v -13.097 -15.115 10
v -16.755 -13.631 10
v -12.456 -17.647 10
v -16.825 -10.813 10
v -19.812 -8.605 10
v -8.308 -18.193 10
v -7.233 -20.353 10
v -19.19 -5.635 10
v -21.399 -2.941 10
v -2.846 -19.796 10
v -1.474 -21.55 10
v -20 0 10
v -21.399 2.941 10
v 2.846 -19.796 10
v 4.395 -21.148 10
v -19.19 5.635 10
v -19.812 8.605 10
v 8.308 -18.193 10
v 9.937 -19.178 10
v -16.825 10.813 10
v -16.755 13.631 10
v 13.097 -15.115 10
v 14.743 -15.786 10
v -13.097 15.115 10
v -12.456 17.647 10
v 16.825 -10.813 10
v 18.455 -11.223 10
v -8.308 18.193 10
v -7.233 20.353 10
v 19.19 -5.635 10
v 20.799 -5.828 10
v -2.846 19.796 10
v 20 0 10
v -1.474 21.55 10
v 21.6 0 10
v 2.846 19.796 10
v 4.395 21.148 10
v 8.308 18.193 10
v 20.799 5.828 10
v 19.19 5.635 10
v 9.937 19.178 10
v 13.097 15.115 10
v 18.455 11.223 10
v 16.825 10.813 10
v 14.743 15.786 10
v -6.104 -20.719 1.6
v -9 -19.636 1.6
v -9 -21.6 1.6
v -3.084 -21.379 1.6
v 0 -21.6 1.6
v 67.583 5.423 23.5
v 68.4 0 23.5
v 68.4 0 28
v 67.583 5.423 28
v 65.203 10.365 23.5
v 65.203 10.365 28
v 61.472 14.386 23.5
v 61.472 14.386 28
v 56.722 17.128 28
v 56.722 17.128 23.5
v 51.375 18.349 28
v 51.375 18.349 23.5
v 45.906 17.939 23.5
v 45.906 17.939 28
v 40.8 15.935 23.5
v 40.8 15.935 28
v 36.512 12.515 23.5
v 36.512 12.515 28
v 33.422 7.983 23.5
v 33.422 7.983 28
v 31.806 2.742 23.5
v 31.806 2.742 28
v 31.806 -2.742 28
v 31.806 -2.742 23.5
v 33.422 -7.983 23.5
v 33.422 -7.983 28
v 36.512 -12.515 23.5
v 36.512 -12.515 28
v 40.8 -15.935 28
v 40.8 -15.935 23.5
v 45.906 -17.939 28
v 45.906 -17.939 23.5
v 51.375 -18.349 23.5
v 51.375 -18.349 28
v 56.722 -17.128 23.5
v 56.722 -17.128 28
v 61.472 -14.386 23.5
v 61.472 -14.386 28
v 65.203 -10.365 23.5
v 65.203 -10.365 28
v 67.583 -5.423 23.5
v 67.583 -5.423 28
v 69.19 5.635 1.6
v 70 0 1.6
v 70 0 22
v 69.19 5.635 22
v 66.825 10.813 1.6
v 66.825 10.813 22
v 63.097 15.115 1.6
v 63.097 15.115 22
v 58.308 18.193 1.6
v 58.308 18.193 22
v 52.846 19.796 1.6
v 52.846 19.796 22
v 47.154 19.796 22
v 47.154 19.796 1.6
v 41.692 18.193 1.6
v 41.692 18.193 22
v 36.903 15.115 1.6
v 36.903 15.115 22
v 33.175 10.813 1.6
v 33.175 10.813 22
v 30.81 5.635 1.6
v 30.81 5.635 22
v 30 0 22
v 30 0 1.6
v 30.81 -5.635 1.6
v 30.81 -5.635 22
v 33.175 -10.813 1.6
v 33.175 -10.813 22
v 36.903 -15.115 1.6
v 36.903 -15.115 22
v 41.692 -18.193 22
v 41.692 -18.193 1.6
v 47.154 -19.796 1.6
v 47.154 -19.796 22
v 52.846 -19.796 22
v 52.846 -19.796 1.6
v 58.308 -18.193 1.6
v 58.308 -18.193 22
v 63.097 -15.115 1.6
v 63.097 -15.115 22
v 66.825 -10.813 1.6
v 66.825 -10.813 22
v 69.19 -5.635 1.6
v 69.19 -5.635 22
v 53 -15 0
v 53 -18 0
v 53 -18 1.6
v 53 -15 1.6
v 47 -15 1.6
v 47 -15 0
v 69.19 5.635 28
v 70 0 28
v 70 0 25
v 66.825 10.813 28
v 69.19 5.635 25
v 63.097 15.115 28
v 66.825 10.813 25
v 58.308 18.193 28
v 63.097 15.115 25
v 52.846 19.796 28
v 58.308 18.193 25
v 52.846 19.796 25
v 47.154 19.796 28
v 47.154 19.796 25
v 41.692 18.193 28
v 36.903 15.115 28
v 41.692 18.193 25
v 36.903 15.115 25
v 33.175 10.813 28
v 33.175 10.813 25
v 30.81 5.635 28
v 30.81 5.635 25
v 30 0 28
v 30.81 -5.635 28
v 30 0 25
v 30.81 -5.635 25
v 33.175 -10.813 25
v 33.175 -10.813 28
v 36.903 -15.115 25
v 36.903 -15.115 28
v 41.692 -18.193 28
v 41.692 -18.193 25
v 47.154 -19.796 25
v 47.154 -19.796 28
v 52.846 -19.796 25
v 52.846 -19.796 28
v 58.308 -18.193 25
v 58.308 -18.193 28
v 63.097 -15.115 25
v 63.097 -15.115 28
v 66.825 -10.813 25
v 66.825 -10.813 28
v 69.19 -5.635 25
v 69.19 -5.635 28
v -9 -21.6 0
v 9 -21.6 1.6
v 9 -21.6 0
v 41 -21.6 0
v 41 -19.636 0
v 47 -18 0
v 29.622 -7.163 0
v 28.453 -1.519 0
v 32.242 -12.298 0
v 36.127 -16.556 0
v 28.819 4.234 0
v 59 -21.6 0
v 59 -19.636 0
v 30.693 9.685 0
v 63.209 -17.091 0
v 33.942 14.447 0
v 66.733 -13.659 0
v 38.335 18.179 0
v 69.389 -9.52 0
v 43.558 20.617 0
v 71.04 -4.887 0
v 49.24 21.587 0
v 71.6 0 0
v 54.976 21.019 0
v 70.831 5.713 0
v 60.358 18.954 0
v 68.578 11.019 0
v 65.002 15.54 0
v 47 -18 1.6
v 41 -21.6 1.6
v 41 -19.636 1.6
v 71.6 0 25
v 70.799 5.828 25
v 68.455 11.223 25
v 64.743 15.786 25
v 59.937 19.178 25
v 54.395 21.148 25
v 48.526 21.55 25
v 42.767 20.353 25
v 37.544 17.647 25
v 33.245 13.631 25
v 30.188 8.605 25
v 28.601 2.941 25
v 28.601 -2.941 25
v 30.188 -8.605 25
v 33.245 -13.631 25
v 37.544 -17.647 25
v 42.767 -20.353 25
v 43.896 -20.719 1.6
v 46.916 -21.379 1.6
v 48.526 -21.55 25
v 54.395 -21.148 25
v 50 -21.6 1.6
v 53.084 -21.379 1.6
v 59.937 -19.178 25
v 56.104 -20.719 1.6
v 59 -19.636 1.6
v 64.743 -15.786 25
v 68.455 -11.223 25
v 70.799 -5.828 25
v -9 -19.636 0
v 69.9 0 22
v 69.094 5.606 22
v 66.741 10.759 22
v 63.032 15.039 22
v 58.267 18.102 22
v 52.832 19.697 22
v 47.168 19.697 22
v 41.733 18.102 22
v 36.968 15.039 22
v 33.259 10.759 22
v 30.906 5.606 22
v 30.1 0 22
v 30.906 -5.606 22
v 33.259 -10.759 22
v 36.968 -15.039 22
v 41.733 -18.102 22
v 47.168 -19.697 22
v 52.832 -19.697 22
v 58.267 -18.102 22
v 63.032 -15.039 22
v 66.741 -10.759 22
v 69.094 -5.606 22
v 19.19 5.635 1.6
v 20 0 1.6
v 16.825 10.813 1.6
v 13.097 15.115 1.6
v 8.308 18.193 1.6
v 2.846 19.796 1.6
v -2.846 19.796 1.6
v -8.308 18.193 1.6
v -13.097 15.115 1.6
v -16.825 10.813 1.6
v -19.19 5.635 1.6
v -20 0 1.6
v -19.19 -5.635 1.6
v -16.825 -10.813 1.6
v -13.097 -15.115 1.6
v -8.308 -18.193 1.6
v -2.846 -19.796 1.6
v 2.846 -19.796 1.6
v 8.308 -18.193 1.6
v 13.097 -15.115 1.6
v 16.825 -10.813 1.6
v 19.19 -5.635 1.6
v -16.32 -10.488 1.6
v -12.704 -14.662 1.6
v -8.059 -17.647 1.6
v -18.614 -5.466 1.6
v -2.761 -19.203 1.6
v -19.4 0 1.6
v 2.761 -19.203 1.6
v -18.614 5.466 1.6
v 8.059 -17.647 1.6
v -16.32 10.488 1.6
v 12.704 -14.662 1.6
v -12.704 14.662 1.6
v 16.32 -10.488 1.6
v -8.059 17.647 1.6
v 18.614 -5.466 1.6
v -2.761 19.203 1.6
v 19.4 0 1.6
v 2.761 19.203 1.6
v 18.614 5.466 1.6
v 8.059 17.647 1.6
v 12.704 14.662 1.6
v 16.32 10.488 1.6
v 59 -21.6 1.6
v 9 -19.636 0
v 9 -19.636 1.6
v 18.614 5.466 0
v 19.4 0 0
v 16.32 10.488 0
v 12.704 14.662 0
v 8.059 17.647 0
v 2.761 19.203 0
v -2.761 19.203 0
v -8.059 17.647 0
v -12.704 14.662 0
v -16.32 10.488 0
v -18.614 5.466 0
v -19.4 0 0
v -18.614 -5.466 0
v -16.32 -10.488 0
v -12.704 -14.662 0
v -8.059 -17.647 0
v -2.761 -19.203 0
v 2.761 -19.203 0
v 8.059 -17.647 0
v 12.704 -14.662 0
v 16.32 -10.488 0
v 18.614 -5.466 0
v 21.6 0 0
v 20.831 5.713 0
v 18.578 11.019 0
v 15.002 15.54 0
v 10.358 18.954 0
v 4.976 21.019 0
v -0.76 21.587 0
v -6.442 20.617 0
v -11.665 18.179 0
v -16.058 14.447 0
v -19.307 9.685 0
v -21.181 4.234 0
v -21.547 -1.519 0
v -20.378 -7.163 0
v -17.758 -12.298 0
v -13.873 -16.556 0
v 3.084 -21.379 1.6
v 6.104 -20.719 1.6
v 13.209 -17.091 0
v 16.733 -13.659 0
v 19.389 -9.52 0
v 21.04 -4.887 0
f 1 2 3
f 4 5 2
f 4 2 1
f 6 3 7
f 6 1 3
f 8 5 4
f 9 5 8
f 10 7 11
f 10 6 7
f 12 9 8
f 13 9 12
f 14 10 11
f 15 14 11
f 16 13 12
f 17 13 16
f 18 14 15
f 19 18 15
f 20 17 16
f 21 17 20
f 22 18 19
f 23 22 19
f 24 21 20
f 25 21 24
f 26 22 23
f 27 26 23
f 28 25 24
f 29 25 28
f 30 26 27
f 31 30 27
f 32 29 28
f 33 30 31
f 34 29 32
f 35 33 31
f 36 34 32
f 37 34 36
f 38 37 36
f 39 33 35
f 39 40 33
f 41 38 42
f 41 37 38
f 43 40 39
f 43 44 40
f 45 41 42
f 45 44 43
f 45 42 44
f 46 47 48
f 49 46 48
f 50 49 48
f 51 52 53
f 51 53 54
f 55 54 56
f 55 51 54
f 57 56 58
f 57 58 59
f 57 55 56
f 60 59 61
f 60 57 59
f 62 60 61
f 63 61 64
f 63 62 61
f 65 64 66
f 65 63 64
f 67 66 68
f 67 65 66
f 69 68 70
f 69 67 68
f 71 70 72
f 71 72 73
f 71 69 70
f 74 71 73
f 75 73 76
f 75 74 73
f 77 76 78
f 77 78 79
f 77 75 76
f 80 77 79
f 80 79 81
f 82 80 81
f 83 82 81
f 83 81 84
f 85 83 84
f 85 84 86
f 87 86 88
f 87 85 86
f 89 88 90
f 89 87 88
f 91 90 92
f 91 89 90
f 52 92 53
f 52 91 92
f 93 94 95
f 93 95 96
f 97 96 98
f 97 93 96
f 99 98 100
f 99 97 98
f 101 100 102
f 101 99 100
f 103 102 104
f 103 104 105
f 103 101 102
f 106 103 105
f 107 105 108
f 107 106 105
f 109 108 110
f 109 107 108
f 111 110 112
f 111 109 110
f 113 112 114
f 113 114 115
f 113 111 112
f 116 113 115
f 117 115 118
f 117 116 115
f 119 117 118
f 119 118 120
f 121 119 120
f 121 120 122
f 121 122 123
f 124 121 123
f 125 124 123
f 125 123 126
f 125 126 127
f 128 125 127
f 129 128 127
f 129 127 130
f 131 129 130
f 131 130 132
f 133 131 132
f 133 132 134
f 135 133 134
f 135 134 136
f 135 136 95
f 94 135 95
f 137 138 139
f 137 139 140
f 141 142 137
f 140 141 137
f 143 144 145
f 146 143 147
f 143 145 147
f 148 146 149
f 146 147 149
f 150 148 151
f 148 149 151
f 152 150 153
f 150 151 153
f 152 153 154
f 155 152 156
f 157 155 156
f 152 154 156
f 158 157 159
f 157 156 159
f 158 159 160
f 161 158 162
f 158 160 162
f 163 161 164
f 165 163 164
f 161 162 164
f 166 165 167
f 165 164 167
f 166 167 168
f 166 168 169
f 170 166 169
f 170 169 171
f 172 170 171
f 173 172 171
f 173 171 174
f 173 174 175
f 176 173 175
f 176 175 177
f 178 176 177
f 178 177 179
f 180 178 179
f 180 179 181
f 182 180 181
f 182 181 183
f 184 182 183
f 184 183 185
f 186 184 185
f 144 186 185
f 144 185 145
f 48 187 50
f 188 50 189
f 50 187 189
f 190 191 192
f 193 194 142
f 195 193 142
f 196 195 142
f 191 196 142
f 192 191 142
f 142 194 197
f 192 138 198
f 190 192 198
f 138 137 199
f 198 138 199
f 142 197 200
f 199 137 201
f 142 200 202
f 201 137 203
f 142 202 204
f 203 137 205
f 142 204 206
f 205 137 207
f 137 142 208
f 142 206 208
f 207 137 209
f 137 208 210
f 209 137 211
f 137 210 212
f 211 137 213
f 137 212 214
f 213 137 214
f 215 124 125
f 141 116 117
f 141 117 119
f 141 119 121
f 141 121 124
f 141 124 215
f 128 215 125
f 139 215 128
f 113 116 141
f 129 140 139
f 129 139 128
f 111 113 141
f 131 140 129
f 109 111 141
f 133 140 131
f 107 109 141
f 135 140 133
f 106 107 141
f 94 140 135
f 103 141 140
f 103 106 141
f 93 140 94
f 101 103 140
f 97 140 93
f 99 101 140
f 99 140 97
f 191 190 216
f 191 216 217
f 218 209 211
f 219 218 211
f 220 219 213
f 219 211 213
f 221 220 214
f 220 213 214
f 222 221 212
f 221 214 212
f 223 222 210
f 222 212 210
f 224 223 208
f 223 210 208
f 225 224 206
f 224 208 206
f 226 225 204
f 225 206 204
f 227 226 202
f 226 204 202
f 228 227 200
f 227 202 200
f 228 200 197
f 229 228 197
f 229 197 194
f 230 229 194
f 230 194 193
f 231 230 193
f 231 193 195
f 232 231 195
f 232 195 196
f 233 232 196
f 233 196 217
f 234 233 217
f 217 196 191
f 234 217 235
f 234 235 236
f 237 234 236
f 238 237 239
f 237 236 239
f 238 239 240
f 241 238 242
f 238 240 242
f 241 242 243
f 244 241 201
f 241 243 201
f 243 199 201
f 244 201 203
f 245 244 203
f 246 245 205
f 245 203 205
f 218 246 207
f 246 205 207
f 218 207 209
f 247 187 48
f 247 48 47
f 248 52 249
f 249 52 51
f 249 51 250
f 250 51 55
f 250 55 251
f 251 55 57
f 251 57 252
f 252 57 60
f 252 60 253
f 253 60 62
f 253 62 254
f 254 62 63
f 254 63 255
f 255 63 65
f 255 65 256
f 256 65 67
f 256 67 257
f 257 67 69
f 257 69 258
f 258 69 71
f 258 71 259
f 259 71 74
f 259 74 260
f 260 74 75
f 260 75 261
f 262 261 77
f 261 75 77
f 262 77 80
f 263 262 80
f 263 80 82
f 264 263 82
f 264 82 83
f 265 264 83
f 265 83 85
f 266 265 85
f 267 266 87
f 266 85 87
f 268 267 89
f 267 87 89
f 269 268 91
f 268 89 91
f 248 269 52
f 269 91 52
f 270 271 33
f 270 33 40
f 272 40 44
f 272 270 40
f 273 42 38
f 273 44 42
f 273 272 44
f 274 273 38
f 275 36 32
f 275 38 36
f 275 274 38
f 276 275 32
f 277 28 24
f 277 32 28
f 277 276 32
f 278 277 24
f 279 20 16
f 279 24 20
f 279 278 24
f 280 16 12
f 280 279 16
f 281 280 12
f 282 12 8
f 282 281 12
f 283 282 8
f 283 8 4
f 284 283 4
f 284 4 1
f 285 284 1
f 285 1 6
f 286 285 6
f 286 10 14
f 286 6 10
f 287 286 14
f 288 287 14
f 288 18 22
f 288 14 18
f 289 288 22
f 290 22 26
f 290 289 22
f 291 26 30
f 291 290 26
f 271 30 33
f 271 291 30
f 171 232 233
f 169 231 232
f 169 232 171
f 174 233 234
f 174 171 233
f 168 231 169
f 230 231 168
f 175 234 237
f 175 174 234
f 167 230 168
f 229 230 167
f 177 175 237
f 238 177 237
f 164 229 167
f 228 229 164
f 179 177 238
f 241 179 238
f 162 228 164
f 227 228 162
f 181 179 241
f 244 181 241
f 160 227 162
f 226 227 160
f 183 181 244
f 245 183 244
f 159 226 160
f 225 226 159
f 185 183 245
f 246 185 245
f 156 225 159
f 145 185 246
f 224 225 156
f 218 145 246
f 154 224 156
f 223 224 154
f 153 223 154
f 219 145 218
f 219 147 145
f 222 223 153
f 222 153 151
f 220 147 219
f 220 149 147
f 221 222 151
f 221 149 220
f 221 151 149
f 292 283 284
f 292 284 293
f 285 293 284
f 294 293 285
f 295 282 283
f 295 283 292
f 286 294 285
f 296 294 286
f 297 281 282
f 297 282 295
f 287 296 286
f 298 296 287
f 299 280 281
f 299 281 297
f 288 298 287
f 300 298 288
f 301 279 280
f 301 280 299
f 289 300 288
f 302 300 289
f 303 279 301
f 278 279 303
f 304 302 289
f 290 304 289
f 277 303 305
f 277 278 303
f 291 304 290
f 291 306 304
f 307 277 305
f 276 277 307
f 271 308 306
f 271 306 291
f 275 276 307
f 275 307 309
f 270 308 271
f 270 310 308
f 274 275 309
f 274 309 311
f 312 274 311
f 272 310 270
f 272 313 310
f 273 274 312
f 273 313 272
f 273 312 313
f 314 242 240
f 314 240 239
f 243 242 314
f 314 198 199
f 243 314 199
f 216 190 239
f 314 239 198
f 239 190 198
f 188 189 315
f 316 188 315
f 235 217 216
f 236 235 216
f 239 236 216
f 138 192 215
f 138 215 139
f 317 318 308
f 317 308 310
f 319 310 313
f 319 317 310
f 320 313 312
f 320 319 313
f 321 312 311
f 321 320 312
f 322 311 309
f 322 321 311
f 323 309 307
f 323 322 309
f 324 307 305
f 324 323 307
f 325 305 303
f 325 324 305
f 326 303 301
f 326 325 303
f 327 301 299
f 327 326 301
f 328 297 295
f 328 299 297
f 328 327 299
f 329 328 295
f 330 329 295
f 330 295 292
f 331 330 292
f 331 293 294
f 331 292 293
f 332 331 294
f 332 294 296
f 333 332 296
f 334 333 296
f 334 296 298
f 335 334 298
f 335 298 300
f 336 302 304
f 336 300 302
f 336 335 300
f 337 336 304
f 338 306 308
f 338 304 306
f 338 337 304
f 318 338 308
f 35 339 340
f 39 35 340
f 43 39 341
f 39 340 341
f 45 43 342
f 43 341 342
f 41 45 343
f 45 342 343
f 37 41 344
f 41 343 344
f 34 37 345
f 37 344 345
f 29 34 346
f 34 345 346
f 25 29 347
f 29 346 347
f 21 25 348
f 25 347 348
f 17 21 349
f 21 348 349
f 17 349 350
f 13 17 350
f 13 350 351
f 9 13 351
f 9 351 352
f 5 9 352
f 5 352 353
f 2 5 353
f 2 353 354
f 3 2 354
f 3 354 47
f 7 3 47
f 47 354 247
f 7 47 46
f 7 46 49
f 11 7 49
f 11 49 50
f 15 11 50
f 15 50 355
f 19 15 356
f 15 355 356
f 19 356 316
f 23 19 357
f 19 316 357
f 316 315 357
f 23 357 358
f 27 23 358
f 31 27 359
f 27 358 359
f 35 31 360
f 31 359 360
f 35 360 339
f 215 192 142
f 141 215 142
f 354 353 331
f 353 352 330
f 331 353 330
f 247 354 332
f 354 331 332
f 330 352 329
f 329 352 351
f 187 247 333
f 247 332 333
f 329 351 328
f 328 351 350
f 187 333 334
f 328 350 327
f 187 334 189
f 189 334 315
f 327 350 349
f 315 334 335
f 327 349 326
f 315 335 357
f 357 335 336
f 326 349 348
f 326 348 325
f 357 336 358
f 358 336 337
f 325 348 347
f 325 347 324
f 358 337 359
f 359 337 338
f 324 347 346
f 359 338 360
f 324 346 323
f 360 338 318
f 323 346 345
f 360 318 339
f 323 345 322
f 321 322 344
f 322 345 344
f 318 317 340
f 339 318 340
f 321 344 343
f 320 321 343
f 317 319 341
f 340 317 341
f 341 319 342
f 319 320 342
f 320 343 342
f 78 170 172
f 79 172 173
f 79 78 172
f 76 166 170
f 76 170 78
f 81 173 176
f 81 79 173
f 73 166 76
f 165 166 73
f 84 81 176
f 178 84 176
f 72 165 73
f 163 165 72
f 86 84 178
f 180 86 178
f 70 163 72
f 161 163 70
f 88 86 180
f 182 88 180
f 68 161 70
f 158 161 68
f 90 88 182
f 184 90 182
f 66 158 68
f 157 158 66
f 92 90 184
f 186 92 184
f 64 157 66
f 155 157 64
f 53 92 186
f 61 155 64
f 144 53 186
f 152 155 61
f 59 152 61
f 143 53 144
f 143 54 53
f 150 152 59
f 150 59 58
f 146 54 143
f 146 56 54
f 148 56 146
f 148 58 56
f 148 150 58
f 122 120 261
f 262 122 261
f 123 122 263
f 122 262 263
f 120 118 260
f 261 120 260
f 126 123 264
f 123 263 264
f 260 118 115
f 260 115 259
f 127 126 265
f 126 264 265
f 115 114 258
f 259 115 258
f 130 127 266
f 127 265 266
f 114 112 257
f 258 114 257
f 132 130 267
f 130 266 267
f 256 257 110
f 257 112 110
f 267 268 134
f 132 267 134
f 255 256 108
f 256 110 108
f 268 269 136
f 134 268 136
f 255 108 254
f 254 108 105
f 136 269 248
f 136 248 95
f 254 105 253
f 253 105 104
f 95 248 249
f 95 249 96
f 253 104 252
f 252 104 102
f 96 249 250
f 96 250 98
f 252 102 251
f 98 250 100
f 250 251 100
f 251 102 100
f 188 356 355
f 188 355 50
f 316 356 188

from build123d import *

# Parameters (mm, degrees)
CYLINDER006_R     = 18.4
CYLINDER006_DEPTH = 6
CYLINDER005_R     = 20
CYLINDER005_DEPTH = 6
CHAMFER_SIZE      = 1.5
BOX001_W          = 18
BOX001_H          = 2.1
BOX001_DEPTH      = 1.6
BOX002_W          = 6
BOX002_H          = 3
BOX002_DEPTH      = 10
CYLINDER004_R     = 20
CYLINDER004_DEPTH = 25
CYLINDER003_R     = 21.6
CYLINDER003_DEPTH = 25
BOX_W             = 18
BOX_H             = 2.1
BOX_DEPTH         = 1.6
CYLINDER_R        = 19.4
CYLINDER_DEPTH    = 10
CYLINDER002_R     = 20
CYLINDER002_DEPTH = 10
CYLINDER001_R     = 21.6
CYLINDER001_DEPTH = 10


with BuildPart() as zylinder006:
    # Cylinder006 → Cylinder006 (new body)
    with BuildSketch(Plane(origin=(100, 0, 0), x_dir=(1, 0, 0), z_dir=(0, 0, 1))):
        Circle(CYLINDER006_R)
    extrude(amount=CYLINDER006_DEPTH)


with BuildPart() as chamfer_body:
    # Cylinder005 → Cylinder005 (new body)
    with BuildSketch(Plane(origin=(100, 0, 0), x_dir=(1, 0, 0), z_dir=(0, 0, 1))):
        Circle(CYLINDER005_R)
    extrude(amount=CYLINDER005_DEPTH)

    # Cut004: cut Zylinder006
    add(zylinder006.part, mode=Mode.SUBTRACT)

    # Chamfer
    chamfer_edges = [chamfer_body.edges().sort_by_distance(p)[0] for p in [
        (81.6, 0, 0),
    ]]
    chamfer(chamfer_edges, length=CHAMFER_SIZE)


with BuildPart() as chamfer_body_1:
    # Chamfer placement: moved
    add(chamfer_body.part.moved(Location((-50, 0, 22))))


with BuildPart() as w_rfel001:
    # Box001 → Box001 (new body)
    with BuildSketch(Plane(origin=(41, -21.6, 0), x_dir=(1, 0, 0), z_dir=(0, 0, 1))):
        with Locations((9, 1.05)):
            Rectangle(BOX001_W, BOX001_H)
    extrude(amount=BOX001_DEPTH)


with BuildPart() as w_rfel002:
    # Box002 → Box002 (new body)
    with BuildSketch(Plane(origin=(47, -18, 0), x_dir=(1, 0, 0), z_dir=(0, 0, 1))):
        with Locations((3, 1.5)):
            Rectangle(BOX002_W, BOX002_H)
    extrude(amount=BOX002_DEPTH)


with BuildPart() as zylinder004:
    # Cylinder004 → Cylinder004 (new body)
    with BuildSketch(Plane(origin=(50, 0, 1.6), x_dir=(1, 0, 0), z_dir=(0, 0, 1))):
        Circle(CYLINDER004_R)
    extrude(amount=CYLINDER004_DEPTH)


with BuildPart() as fusion001:
    # Cylinder003 → Cylinder003 (new body)
    with BuildSketch(Plane(origin=(50, 0, 0), x_dir=(1, 0, 0), z_dir=(0, 0, 1))):
        Circle(CYLINDER003_R)
    extrude(amount=CYLINDER003_DEPTH)

    # Cut002: cut Zylinder004
    add(zylinder004.part, mode=Mode.SUBTRACT)

    # Cut003: cut Würfel002
    add(w_rfel002.part, mode=Mode.SUBTRACT)

    # Fusion001: union Chamfer body, Würfel001
    add(chamfer_body_1.part)
    add(w_rfel001.part)


with BuildPart() as w_rfel:
    # Box → Box (new body)
    with BuildSketch(Plane(origin=(-9, -21.6, 0), x_dir=(1, 0, 0), z_dir=(0, 0, 1))):
        with Locations((9, 1.05)):
            Rectangle(BOX_W, BOX_H)
    extrude(amount=BOX_DEPTH)


with BuildPart() as zylinder:
    # Cylinder → Cylinder (new body)
    with BuildSketch(Plane.XY):
        Circle(CYLINDER_R)
    extrude(amount=CYLINDER_DEPTH)


with BuildPart() as zylinder002:
    # Cylinder002 → Cylinder002 (new body)
    with BuildSketch(Plane.XY.offset(1.6)):
        Circle(CYLINDER002_R)
    extrude(amount=CYLINDER002_DEPTH)


with BuildPart() as fusion002:
    # Cylinder001 → Cylinder001 (new body)
    with BuildSketch(Plane.XY):
        Circle(CYLINDER001_R)
    extrude(amount=CYLINDER001_DEPTH)

    # Cut: cut Zylinder002
    add(zylinder002.part, mode=Mode.SUBTRACT)

    # Cut001: cut Zylinder
    add(zylinder.part, mode=Mode.SUBTRACT)

    # Fusion: union Würfel
    add(w_rfel.part)

    # Fusion002: union Fusion001
    add(fusion001.part)


solid = fusion002.part
